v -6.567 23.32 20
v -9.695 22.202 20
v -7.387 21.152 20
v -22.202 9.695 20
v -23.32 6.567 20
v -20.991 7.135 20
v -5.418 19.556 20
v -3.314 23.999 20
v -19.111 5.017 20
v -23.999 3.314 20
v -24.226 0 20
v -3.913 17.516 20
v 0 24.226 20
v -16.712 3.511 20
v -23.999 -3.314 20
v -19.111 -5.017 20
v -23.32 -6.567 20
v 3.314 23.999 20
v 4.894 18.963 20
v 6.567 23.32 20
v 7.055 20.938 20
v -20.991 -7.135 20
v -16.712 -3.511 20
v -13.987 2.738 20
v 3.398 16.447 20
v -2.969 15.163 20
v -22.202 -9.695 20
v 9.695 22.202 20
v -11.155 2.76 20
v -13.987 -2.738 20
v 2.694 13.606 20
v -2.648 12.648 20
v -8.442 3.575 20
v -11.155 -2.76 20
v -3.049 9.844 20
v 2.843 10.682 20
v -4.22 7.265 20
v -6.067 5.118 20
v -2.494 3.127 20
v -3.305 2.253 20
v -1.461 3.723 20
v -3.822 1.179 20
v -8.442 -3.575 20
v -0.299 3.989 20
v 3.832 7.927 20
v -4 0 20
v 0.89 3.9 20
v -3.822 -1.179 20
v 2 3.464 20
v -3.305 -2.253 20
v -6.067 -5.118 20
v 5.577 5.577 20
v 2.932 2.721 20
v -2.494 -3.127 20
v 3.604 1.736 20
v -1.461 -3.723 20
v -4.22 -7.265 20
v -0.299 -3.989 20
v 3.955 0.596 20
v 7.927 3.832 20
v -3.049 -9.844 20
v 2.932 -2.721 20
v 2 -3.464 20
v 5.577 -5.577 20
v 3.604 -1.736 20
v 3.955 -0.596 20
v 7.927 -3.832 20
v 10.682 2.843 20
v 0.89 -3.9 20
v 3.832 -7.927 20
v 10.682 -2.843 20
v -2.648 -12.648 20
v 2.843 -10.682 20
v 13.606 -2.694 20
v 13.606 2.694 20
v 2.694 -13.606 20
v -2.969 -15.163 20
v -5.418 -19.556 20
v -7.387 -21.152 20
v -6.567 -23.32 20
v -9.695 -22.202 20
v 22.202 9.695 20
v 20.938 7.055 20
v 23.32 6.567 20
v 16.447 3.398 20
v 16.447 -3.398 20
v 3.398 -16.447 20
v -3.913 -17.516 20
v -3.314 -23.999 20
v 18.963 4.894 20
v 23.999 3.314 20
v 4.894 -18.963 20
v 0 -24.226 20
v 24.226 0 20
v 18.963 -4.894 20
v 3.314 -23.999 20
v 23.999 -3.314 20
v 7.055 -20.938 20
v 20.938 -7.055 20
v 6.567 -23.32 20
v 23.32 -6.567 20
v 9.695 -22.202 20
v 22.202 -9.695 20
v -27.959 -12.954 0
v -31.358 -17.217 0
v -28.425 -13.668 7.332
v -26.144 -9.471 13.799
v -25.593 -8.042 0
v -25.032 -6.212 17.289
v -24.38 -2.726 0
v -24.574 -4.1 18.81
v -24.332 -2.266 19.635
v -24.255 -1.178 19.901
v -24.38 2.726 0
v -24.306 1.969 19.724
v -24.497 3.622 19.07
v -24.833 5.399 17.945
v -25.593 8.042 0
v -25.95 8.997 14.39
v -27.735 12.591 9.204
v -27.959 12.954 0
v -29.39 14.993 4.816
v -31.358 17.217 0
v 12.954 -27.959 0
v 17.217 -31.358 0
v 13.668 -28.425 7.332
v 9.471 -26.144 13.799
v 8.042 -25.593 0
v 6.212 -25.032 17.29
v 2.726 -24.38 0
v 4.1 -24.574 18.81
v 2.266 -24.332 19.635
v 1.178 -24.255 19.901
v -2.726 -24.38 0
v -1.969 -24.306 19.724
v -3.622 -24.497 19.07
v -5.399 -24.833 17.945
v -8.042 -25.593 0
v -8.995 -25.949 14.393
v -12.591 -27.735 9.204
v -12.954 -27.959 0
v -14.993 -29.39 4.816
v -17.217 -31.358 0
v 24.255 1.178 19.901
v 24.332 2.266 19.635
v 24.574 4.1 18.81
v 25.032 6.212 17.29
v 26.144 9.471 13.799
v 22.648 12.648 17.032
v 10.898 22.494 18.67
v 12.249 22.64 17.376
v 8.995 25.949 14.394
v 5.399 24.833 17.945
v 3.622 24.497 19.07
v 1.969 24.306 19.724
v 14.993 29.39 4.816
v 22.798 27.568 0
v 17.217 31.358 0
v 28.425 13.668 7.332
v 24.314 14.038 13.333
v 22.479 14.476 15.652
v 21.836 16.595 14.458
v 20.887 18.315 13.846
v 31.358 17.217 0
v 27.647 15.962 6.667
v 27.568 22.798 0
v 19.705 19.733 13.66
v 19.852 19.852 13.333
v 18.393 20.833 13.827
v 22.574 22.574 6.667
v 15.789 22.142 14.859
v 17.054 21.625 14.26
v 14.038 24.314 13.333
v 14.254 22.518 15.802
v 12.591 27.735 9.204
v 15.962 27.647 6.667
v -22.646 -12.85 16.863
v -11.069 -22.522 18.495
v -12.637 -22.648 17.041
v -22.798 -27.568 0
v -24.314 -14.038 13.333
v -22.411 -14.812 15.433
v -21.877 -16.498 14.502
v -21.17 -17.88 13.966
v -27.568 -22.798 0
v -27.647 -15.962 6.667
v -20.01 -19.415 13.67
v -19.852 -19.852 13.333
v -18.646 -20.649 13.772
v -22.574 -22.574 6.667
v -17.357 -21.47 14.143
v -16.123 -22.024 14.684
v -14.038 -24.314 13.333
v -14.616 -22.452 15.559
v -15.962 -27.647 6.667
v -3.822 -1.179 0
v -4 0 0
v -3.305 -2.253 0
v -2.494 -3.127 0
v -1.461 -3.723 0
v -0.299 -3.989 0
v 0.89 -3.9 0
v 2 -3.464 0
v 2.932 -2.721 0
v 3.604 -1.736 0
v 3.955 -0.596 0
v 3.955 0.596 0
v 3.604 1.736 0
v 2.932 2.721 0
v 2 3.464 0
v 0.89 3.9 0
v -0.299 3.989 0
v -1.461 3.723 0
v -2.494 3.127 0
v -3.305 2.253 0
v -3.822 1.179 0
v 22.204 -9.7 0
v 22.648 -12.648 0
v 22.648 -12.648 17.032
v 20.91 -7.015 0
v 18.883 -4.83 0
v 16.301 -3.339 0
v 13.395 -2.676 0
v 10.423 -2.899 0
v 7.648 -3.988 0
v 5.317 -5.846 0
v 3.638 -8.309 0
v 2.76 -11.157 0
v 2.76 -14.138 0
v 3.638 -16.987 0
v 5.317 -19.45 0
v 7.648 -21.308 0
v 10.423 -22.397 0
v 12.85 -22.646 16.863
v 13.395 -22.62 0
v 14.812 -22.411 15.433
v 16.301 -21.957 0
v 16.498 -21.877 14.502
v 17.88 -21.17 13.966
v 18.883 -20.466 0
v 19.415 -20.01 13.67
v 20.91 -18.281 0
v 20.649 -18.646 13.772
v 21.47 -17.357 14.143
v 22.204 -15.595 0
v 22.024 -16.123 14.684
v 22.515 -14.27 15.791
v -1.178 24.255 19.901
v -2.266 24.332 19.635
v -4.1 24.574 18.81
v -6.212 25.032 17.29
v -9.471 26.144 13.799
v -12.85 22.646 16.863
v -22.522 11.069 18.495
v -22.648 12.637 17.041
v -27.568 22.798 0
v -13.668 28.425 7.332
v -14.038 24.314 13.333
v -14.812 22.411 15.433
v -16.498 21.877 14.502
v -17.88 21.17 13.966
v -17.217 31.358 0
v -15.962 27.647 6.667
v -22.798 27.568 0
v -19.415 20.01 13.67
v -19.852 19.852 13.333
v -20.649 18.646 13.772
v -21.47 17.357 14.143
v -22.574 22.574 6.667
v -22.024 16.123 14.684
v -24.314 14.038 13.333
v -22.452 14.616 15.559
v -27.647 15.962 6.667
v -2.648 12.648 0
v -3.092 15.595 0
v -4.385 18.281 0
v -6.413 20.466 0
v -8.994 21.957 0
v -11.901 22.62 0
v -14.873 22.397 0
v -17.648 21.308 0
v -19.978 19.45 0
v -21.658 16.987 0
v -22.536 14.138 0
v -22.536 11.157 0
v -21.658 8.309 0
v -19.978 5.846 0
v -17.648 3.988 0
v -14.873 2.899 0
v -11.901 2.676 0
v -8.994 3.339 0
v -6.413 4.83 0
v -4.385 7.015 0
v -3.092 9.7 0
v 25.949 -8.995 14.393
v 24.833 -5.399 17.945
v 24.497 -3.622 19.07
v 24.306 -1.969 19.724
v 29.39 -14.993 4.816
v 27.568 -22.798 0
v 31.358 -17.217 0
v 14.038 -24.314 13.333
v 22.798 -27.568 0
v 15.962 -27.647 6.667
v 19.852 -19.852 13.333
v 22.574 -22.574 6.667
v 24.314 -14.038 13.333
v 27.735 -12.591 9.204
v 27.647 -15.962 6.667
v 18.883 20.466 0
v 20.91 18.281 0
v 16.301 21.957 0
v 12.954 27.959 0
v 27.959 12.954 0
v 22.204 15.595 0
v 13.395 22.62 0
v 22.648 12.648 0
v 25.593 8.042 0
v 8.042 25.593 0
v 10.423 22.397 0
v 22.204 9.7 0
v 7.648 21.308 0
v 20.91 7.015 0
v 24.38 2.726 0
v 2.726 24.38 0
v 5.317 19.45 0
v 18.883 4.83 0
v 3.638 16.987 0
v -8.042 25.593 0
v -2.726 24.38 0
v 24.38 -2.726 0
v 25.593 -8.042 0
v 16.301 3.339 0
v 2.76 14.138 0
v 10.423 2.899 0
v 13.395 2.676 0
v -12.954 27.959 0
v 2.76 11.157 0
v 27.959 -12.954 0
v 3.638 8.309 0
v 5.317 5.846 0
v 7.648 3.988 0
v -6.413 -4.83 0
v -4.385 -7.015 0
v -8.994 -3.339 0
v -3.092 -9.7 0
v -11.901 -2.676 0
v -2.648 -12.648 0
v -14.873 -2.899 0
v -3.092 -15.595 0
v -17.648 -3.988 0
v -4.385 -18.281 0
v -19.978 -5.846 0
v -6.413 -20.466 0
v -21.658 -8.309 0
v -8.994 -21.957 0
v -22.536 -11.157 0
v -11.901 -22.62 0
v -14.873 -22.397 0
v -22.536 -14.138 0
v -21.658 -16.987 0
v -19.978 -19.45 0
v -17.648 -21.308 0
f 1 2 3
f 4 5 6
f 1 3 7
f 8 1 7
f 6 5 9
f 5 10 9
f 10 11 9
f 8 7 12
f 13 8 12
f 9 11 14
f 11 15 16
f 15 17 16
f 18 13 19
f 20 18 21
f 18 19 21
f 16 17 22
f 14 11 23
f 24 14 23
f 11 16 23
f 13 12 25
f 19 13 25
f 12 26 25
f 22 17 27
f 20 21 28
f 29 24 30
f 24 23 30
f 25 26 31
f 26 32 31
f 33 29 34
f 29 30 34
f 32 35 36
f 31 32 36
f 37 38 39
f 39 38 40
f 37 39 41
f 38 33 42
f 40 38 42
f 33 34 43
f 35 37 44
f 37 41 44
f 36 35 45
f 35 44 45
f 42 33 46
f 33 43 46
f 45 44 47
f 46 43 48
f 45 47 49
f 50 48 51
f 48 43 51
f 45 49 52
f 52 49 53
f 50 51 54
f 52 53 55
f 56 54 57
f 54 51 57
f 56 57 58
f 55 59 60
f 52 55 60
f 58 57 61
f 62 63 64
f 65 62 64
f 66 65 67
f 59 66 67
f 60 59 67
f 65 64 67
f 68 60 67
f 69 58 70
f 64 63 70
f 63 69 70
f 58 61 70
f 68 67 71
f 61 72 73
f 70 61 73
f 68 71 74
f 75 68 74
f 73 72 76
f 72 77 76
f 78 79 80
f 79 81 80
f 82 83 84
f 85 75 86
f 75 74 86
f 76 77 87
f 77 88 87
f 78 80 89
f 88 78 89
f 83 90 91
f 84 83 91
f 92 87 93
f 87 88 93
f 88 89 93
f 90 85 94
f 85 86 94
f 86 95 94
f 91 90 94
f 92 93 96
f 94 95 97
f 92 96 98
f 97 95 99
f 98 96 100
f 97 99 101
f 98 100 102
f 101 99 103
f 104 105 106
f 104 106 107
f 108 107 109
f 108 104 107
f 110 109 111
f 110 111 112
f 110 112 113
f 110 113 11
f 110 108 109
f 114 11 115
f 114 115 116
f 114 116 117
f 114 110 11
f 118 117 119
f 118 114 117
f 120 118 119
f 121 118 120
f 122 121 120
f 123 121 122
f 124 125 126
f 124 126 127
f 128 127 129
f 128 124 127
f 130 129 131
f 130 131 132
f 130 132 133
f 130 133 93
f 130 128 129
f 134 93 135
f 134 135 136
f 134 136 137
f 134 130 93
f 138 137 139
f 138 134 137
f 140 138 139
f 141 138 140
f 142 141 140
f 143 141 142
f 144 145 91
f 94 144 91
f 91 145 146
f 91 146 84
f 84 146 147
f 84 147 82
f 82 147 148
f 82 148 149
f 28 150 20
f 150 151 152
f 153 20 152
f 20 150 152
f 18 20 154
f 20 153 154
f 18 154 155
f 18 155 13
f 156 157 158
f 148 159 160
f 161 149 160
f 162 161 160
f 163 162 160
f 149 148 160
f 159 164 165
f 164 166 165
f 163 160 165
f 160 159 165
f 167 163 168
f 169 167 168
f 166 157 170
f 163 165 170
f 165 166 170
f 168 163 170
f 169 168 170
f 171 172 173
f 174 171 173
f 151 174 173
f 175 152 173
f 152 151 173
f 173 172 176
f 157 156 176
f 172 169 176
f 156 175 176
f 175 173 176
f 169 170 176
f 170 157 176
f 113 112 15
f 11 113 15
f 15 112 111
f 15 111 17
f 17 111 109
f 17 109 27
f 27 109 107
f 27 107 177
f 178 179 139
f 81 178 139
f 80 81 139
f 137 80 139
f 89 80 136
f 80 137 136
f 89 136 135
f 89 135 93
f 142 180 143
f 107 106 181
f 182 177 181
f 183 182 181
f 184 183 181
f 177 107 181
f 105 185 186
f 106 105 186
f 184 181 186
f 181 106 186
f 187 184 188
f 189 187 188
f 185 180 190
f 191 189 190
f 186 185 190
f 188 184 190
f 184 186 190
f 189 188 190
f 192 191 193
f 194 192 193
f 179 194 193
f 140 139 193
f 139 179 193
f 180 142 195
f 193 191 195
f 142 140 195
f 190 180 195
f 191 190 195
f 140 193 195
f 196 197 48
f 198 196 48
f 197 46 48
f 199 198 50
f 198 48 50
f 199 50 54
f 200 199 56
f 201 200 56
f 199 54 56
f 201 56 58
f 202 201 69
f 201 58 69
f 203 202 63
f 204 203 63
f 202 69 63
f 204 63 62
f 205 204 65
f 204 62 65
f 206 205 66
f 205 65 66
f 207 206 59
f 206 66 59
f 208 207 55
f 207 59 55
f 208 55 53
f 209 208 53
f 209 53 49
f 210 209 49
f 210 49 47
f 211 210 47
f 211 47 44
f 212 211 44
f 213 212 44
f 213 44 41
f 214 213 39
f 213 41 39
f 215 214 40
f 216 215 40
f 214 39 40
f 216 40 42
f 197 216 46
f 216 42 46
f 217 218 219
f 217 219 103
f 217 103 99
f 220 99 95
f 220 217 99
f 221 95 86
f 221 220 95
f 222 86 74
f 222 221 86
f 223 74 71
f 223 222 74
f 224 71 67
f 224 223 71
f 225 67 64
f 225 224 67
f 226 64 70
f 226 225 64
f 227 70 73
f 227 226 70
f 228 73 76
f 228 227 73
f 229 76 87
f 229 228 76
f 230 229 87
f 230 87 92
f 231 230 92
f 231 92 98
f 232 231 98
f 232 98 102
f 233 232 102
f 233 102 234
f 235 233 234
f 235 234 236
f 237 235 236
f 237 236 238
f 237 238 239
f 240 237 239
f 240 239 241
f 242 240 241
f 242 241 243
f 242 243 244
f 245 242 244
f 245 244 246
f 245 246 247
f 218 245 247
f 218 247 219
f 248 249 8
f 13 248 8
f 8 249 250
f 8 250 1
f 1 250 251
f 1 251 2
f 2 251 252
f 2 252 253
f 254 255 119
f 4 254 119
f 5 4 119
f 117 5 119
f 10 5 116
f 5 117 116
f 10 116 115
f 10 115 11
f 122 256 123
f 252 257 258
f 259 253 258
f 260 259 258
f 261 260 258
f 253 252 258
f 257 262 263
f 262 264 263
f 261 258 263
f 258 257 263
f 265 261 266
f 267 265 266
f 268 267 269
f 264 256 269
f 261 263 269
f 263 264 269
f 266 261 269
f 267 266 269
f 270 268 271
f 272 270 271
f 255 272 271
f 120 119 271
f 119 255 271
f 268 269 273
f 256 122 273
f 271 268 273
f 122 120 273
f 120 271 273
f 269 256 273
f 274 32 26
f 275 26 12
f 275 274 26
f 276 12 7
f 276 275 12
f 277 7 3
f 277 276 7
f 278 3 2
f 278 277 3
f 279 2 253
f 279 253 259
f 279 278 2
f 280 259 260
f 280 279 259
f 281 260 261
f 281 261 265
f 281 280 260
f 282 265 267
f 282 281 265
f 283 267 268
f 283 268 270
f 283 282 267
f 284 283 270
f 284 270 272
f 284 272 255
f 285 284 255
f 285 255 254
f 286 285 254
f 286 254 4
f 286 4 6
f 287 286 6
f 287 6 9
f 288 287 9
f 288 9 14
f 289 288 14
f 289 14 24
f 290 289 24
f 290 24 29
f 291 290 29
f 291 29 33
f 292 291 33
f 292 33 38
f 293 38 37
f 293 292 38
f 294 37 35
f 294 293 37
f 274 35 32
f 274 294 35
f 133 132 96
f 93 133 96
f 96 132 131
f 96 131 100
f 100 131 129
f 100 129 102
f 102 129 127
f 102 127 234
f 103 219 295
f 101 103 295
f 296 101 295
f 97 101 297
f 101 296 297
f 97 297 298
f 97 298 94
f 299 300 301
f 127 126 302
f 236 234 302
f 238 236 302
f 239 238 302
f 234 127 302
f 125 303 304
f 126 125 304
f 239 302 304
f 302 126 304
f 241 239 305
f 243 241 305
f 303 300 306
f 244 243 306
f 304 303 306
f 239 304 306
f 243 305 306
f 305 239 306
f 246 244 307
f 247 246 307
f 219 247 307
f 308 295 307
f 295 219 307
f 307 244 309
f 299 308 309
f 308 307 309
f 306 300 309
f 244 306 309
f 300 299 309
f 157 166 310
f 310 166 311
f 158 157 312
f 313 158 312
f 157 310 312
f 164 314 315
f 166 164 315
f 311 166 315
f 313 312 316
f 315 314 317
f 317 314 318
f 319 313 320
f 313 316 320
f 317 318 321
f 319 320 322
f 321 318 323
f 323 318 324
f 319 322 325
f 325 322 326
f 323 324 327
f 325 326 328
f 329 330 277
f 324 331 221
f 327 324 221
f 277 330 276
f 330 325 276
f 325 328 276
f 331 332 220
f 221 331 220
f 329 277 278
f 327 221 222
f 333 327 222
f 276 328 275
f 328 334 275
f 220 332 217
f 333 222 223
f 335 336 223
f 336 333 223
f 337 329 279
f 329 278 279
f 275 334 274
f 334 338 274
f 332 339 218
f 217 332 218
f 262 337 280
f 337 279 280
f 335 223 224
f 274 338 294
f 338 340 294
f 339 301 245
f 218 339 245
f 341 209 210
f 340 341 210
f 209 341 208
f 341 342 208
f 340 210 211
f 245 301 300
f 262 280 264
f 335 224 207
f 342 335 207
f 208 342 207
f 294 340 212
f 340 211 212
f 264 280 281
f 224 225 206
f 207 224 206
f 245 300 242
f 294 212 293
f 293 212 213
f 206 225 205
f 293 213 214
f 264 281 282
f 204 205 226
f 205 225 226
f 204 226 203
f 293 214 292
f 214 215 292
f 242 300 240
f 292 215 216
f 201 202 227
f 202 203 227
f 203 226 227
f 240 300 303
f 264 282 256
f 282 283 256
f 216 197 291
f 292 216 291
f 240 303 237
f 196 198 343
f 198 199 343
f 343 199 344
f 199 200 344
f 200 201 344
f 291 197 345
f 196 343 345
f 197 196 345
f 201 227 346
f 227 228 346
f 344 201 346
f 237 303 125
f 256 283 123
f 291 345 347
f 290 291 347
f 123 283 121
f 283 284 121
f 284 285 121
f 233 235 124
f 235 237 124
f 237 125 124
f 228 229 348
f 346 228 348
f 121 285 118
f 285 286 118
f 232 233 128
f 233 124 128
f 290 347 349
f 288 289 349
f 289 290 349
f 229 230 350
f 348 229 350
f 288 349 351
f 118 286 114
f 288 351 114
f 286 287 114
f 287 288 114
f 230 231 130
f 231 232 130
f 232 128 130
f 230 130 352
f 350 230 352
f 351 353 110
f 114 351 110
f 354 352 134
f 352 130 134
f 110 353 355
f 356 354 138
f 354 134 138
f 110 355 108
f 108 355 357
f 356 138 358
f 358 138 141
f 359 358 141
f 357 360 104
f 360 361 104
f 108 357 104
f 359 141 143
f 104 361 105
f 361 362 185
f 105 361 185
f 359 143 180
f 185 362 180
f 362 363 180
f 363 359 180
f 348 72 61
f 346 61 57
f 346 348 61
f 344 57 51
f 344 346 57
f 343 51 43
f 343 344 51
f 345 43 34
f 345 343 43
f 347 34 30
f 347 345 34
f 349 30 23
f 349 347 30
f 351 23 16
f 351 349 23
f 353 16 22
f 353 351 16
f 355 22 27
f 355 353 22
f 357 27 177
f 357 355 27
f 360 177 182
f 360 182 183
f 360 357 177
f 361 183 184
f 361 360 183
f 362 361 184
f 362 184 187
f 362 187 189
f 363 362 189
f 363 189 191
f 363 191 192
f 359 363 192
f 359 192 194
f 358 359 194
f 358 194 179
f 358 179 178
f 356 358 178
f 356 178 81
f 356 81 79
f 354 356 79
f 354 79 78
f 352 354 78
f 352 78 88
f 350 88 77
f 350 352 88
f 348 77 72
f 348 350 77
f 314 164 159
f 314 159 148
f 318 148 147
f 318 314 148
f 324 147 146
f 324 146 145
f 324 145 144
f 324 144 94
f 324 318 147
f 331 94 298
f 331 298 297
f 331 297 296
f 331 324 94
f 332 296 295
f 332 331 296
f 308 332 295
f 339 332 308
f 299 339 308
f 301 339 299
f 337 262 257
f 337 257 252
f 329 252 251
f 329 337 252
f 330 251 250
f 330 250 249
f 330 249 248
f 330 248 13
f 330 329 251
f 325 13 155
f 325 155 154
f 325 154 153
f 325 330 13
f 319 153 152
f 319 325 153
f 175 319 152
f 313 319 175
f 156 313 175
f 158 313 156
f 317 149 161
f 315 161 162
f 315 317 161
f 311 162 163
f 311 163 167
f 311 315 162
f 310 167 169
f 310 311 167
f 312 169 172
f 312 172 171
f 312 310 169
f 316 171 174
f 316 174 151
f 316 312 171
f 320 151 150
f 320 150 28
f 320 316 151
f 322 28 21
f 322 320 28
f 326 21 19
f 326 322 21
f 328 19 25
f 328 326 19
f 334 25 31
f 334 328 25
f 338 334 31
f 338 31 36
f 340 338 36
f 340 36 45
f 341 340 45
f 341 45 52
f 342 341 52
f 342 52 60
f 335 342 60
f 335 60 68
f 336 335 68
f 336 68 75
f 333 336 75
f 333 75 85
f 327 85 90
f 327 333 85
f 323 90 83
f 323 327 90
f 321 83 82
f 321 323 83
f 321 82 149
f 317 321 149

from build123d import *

# Parameters (mm, degrees)
F3_DEPTH = 20.001
F4_R     = 10
F5_DEPTH = 20.0010001


with BuildPart() as f1:
    # F0 (on Front) → F1 (revolve)
    with BuildSketch(Plane.XZ):
        Polygon((-4, 0), (-4, 20), (-24.2264973081, 20), (-35.7735026919, 0), align=None)
    revolve(axis=Axis((0, 0, 10), (0, 0, 1)))

    # F2 (on Top) → F3 (cut, through all)
    with BuildSketch(Plane.XY):
        with BuildLine():
            ThreePointArc((-17.2168920075, 31.3579674795), (0, 24.2264973081), (17.2168920075, 31.3579674795))
            ThreePointArc((17.2168920075, 31.3579674795), (0, 35.7735026919), (-17.2168920075, 31.3579674795))
        make_face()
        with BuildLine():
            ThreePointArc((31.3579674795, -17.2168920075), (34.6520405524, -8.887045651), (35.7735026919, 0))
            ThreePointArc((35.7735026919, 0), (34.6520405524, 8.887045651), (31.3579674795, 17.2168920075))
            ThreePointArc((31.3579674795, 17.2168920075), (24.2264973081, 0), (31.3579674795, -17.2168920075))
        make_face()
        with BuildLine():
            ThreePointArc((-17.2168920075, -31.3579674795), (0, -35.7735026919), (17.2168920075, -31.3579674795))
            ThreePointArc((17.2168920075, -31.3579674795), (0, -24.2264973081), (-17.2168920075, -31.3579674795))
        make_face()
        with BuildLine():
            ThreePointArc((-31.3579674795, -17.2168920075), (-24.2264973081, 0), (-31.3579674795, 17.2168920075))
            ThreePointArc((-31.3579674795, 17.2168920075), (-35.7735026919, 0), (-31.3579674795, -17.2168920075))
        make_face()
    extrude(amount=F3_DEPTH, mode=Mode.SUBTRACT)

    # F4 (on Top) → F5 (cut, through all)
    with BuildSketch(Plane.XY):
        with Locations((-12.6478431701, -12.6478431701)):
            Circle(F4_R)
        with Locations((12.6478431701, -12.6478431701)):
            Circle(F4_R)
        with Locations((12.6478431701, 12.6478431701)):
            Circle(F4_R)
        with Locations((-12.6478431701, 12.6478431701)):
            Circle(F4_R)
    extrude(amount=F5_DEPTH, mode=Mode.SUBTRACT)


solid = f1.part
